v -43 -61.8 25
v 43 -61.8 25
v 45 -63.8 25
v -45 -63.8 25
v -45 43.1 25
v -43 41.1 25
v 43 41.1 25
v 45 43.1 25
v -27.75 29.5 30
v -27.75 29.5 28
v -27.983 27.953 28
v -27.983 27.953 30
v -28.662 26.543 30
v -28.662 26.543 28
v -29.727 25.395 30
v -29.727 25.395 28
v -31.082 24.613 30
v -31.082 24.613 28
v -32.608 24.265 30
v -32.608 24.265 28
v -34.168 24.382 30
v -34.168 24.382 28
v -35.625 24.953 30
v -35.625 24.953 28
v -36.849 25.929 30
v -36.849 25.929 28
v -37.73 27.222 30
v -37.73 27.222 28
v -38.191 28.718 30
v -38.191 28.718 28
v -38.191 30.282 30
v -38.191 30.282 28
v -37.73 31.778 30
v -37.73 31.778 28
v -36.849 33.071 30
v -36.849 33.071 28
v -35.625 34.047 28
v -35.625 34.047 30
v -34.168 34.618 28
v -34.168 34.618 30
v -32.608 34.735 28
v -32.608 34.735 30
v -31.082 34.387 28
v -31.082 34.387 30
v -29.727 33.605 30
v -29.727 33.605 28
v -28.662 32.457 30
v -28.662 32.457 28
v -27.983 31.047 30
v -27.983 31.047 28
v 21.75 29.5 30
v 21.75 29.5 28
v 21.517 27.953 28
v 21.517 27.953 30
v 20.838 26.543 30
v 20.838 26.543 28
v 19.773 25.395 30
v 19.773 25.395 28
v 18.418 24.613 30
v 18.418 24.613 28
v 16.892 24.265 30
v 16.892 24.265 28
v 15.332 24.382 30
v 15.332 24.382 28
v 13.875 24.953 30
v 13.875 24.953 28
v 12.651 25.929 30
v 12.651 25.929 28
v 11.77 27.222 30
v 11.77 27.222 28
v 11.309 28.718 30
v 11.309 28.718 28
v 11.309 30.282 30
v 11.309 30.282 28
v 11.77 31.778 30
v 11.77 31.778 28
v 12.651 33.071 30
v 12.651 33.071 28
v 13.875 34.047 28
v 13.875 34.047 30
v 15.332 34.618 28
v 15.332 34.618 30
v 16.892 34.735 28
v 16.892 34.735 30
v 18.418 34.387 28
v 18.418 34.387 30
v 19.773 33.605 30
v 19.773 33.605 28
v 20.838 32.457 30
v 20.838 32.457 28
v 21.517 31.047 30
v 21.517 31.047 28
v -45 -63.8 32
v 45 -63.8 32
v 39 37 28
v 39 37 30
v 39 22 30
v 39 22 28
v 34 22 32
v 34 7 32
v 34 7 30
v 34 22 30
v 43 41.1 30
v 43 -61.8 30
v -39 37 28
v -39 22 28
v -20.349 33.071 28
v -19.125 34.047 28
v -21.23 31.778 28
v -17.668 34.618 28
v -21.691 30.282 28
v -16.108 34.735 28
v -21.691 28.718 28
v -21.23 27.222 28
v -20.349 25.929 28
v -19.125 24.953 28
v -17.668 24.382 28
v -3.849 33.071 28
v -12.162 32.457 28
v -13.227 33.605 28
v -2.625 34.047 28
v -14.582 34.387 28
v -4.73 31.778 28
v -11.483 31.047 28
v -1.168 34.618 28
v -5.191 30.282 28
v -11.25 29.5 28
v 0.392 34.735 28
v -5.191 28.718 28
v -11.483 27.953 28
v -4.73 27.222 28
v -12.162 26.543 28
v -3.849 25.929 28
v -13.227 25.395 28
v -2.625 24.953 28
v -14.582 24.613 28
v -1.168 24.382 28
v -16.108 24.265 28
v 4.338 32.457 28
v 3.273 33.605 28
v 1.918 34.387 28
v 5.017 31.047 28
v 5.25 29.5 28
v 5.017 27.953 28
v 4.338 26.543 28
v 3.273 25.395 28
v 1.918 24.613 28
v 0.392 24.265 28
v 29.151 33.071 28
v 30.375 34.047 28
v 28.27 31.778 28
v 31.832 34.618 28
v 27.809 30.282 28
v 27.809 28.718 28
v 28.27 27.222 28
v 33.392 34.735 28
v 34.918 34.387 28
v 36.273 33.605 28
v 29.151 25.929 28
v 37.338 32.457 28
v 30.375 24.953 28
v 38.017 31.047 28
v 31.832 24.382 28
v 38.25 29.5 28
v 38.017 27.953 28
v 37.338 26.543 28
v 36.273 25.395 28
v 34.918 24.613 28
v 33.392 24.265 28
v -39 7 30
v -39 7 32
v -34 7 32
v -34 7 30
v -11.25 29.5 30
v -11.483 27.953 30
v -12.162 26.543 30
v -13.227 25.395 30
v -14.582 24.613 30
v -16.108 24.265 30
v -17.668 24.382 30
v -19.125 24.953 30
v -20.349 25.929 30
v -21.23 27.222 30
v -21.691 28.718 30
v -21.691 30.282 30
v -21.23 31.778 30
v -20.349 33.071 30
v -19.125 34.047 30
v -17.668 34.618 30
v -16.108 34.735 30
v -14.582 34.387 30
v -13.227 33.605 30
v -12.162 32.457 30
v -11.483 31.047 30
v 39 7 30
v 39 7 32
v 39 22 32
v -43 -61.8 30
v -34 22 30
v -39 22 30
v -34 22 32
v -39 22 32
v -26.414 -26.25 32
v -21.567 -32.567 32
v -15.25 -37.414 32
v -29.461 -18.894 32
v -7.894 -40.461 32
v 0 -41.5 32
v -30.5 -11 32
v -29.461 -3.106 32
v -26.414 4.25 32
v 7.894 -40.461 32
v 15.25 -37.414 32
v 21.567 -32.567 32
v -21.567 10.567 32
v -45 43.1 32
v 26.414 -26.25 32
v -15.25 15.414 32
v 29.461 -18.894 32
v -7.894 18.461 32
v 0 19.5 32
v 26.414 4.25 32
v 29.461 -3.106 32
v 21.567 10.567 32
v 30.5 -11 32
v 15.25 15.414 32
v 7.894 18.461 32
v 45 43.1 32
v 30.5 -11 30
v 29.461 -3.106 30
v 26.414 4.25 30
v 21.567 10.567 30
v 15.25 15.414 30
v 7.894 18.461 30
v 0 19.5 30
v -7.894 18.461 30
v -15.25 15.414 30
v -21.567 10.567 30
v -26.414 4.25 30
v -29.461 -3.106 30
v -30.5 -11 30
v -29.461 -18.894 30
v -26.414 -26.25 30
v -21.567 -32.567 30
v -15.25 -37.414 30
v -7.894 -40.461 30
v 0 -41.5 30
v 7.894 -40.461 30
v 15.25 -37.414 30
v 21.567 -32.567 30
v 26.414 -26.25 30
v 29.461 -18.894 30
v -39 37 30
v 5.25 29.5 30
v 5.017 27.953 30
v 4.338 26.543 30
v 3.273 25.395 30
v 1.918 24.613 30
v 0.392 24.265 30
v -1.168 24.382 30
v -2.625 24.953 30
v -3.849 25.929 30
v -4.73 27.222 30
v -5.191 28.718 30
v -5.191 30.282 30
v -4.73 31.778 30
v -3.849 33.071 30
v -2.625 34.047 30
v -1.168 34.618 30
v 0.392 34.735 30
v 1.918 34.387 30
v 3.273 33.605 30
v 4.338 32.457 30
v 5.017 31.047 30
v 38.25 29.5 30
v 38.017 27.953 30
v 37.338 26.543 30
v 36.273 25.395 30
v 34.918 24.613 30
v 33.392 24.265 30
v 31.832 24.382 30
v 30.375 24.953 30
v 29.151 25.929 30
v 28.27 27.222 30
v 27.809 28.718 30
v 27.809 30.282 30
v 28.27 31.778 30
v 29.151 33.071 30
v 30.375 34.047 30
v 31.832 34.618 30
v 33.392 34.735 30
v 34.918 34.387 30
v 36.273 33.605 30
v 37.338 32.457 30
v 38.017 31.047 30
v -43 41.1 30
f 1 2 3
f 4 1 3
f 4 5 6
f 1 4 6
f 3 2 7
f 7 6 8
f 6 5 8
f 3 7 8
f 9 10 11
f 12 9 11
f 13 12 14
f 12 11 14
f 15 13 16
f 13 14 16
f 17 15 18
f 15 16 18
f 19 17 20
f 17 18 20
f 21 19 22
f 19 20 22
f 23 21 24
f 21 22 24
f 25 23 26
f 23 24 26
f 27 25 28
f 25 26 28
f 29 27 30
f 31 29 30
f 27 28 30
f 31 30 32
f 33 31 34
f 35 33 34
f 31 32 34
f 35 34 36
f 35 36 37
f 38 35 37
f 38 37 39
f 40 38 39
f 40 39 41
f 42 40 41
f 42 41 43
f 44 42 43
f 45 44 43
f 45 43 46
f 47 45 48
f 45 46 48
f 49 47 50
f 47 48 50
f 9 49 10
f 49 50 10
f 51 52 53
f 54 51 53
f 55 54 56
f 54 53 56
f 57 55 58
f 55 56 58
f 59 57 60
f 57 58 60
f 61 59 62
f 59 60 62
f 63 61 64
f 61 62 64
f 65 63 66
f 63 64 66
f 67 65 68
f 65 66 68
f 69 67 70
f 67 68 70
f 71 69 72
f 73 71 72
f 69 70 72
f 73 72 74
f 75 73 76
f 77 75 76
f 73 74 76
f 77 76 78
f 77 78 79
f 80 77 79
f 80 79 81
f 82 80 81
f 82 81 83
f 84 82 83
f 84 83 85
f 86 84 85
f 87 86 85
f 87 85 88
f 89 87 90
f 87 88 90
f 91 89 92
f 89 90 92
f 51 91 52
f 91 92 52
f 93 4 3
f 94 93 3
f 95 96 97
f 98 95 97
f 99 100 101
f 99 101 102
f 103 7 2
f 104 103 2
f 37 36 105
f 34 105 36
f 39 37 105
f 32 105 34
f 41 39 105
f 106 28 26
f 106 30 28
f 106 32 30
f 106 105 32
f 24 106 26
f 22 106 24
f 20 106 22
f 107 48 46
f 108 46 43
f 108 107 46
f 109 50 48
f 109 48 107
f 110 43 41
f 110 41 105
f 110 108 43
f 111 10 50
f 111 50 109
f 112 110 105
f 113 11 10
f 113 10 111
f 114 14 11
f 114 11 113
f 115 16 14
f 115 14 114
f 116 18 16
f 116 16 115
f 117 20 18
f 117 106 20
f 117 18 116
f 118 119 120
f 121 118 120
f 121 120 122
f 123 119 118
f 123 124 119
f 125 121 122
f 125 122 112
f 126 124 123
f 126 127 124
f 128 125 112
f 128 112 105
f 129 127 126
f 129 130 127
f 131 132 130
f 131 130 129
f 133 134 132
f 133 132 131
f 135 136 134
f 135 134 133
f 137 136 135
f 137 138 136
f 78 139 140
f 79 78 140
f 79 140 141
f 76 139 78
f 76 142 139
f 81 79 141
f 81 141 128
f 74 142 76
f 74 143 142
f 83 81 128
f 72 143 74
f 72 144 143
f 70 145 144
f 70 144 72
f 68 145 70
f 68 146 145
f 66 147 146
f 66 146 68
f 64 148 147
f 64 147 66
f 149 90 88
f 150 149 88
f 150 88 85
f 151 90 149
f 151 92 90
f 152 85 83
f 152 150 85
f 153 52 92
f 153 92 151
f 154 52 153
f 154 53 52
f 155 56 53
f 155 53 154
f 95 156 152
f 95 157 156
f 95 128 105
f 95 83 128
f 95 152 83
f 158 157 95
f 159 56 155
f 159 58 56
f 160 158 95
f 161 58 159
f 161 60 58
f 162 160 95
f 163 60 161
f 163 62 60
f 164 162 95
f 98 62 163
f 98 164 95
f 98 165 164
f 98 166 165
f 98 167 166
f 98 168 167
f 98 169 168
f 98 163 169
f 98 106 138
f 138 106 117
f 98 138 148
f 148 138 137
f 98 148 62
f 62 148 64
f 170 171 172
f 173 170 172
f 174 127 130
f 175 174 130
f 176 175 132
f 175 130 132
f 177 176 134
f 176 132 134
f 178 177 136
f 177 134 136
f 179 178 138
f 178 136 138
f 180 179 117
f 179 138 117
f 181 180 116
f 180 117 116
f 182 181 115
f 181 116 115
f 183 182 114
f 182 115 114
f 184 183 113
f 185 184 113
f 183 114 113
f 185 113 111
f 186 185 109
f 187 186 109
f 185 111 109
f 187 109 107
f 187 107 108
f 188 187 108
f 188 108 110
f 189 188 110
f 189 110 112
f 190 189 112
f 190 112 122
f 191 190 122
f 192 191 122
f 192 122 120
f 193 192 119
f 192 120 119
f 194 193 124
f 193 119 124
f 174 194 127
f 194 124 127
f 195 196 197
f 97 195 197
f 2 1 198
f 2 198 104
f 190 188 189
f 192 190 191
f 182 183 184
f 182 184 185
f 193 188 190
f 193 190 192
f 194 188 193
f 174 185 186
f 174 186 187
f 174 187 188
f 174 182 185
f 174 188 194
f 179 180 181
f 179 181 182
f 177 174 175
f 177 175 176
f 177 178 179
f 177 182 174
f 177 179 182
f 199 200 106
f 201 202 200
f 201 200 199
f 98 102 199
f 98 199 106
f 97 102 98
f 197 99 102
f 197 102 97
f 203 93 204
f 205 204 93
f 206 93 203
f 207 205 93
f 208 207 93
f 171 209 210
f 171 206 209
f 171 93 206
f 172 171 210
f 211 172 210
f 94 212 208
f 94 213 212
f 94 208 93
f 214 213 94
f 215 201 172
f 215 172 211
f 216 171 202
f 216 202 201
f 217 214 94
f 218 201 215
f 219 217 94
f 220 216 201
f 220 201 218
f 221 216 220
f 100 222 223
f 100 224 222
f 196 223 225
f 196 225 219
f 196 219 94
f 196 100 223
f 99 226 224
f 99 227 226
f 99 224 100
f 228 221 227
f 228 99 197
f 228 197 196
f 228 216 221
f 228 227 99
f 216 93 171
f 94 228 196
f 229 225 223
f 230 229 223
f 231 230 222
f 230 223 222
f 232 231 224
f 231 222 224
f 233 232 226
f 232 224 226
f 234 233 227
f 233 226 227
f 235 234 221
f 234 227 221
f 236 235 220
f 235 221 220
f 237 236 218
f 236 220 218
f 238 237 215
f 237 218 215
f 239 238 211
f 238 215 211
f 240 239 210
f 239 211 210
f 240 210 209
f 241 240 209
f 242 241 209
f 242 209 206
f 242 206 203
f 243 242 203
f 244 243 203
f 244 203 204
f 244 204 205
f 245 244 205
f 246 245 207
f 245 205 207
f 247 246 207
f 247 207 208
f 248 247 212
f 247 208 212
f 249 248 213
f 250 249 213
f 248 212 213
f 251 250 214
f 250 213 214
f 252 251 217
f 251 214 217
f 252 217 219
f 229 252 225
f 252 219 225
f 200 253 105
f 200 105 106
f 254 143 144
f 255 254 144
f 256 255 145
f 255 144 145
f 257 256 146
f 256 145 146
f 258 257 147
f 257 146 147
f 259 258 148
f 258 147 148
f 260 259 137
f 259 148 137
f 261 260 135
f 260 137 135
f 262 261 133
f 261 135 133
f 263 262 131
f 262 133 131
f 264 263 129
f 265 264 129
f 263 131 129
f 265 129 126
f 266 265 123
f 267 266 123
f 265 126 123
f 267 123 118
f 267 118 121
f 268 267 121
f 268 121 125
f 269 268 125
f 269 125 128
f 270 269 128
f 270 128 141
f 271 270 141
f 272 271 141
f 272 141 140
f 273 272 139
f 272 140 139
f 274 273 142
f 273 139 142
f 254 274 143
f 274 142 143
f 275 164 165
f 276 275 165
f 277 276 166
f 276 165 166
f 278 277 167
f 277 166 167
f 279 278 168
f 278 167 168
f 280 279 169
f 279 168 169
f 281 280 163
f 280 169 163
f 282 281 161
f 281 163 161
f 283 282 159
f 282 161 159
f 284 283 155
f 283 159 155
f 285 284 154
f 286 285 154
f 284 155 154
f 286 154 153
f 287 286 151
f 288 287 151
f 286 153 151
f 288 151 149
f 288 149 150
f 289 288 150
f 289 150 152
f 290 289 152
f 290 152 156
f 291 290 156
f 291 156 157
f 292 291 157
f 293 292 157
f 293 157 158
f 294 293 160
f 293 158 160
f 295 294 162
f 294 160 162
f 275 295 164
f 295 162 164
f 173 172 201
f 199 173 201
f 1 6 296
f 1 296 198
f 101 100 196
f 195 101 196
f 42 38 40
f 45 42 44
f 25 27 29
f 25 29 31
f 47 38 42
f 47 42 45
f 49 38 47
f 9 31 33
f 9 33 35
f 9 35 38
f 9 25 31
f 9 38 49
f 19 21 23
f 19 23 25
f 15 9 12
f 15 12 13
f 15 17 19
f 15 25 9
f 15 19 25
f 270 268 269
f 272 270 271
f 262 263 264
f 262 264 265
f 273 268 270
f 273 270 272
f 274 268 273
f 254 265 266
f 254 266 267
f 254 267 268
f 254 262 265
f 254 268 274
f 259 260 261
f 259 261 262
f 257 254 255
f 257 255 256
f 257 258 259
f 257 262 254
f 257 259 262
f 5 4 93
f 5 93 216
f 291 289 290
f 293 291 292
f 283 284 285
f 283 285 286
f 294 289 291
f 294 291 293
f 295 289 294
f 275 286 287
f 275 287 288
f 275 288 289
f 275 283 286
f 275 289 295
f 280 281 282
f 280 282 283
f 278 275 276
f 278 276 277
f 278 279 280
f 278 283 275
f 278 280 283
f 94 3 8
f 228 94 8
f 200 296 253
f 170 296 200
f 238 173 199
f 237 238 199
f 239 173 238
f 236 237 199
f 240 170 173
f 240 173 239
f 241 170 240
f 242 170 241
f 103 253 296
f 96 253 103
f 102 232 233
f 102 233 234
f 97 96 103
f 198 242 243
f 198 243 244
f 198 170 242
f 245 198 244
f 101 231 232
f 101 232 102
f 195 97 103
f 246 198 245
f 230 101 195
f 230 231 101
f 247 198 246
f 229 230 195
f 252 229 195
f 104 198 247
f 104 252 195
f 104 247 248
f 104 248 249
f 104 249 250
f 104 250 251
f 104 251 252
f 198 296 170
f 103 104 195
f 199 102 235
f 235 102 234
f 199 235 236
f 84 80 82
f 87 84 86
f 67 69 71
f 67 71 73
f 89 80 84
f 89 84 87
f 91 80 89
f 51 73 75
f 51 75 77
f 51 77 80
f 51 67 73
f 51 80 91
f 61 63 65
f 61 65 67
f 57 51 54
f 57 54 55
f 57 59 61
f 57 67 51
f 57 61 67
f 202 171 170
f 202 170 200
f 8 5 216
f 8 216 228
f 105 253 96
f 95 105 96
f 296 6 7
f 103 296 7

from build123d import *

# Parameters (mm, degrees)
SKETCH043_W         = 90
SKETCH043_H         = 106.9
PAD015_DEPTH        = 7
SKETCH044_W         = 86
SKETCH044_H         = 102.9
POCKET025_DEPTH     = 5
SKETCH045_R         = 30.5
POCKET026_DEPTH     = 2
SKETCH060_W         = 78
SKETCH060_H         = 15
PAD019_DEPTH        = 2
SKETCH061_R         = 5.25
POCKET038_DEPTH     = 2
LINEARPATTERN_COUNT = 5
LINEARPATTERN_PITCH = 16.5
SKETCH062_W         = 5
SKETCH062_H         = 15
POCKET039_DEPTH     = 7.001


with BuildPart() as part:
    # Sketch043 → Pad015 (new body)
    with BuildSketch(Plane.XY):
        with Locations((0, -10.35)):
            Rectangle(SKETCH043_W, SKETCH043_H)
    extrude(amount=PAD015_DEPTH)

    # Sketch044 (on Face5 of Pad015) → Pocket025 (cut)
    with BuildSketch(Plane(origin=(0, 0, 0), x_dir=(1, 0, 0), z_dir=(0, 0, -1))):
        with Locations((0, 10.35)):
            Rectangle(SKETCH044_W, SKETCH044_H)
    extrude(amount=-POCKET025_DEPTH, mode=Mode.SUBTRACT)

    # Sketch045 (on Face5 of Pocket025) → Pocket026 (cut)
    with BuildSketch(Plane.XY.offset(7)):
        with Locations((0, -11)):
            Circle(SKETCH045_R)
    extrude(amount=-POCKET026_DEPTH, mode=Mode.SUBTRACT)

    # Sketch060 (on Face12 of Pocket026) → Pad019 (join)
    with BuildSketch(Plane(origin=(0, 0, 5), x_dir=(1, 0, 0), z_dir=(0, 0, -1))):
        with Locations((0, -29.5)):
            Rectangle(SKETCH060_W, SKETCH060_H)
    extrude(amount=PAD019_DEPTH)

    # Sketch061 (on Face17 of Pad019) → Pocket038 (cut)
    with BuildSketch(Plane(origin=(0, 0, 3), x_dir=(1, 0, 0), z_dir=(0, 0, -1))):
        with Locations((-33, -29.5)):
            Circle(SKETCH061_R)
    pocket038 = extrude(amount=-POCKET038_DEPTH, mode=Mode.SUBTRACT)

    # LinearPattern: Pocket038 ×5
    with Locations(*[(i * LINEARPATTERN_PITCH, 0, 0) for i in range(1, LINEARPATTERN_COUNT)]):
        add(pocket038, mode=Mode.SUBTRACT)

    # Sketch062 (on Face5 of LinearPattern) → Pocket039 (cut, through all)
    with BuildSketch(Plane.XY.offset(7)):
        with Locations((-36.5, 14.5)):
            Rectangle(SKETCH062_W, SKETCH062_H)
        with Locations((36.5, 14.5)):
            Rectangle(SKETCH062_W, SKETCH062_H)
    extrude(amount=-POCKET039_DEPTH, mode=Mode.SUBTRACT)


with BuildPart() as part_1:
    # Body002 placement: moved
    add(part.part.moved(Location((0, 0, 25))))


solid = part_1.part
